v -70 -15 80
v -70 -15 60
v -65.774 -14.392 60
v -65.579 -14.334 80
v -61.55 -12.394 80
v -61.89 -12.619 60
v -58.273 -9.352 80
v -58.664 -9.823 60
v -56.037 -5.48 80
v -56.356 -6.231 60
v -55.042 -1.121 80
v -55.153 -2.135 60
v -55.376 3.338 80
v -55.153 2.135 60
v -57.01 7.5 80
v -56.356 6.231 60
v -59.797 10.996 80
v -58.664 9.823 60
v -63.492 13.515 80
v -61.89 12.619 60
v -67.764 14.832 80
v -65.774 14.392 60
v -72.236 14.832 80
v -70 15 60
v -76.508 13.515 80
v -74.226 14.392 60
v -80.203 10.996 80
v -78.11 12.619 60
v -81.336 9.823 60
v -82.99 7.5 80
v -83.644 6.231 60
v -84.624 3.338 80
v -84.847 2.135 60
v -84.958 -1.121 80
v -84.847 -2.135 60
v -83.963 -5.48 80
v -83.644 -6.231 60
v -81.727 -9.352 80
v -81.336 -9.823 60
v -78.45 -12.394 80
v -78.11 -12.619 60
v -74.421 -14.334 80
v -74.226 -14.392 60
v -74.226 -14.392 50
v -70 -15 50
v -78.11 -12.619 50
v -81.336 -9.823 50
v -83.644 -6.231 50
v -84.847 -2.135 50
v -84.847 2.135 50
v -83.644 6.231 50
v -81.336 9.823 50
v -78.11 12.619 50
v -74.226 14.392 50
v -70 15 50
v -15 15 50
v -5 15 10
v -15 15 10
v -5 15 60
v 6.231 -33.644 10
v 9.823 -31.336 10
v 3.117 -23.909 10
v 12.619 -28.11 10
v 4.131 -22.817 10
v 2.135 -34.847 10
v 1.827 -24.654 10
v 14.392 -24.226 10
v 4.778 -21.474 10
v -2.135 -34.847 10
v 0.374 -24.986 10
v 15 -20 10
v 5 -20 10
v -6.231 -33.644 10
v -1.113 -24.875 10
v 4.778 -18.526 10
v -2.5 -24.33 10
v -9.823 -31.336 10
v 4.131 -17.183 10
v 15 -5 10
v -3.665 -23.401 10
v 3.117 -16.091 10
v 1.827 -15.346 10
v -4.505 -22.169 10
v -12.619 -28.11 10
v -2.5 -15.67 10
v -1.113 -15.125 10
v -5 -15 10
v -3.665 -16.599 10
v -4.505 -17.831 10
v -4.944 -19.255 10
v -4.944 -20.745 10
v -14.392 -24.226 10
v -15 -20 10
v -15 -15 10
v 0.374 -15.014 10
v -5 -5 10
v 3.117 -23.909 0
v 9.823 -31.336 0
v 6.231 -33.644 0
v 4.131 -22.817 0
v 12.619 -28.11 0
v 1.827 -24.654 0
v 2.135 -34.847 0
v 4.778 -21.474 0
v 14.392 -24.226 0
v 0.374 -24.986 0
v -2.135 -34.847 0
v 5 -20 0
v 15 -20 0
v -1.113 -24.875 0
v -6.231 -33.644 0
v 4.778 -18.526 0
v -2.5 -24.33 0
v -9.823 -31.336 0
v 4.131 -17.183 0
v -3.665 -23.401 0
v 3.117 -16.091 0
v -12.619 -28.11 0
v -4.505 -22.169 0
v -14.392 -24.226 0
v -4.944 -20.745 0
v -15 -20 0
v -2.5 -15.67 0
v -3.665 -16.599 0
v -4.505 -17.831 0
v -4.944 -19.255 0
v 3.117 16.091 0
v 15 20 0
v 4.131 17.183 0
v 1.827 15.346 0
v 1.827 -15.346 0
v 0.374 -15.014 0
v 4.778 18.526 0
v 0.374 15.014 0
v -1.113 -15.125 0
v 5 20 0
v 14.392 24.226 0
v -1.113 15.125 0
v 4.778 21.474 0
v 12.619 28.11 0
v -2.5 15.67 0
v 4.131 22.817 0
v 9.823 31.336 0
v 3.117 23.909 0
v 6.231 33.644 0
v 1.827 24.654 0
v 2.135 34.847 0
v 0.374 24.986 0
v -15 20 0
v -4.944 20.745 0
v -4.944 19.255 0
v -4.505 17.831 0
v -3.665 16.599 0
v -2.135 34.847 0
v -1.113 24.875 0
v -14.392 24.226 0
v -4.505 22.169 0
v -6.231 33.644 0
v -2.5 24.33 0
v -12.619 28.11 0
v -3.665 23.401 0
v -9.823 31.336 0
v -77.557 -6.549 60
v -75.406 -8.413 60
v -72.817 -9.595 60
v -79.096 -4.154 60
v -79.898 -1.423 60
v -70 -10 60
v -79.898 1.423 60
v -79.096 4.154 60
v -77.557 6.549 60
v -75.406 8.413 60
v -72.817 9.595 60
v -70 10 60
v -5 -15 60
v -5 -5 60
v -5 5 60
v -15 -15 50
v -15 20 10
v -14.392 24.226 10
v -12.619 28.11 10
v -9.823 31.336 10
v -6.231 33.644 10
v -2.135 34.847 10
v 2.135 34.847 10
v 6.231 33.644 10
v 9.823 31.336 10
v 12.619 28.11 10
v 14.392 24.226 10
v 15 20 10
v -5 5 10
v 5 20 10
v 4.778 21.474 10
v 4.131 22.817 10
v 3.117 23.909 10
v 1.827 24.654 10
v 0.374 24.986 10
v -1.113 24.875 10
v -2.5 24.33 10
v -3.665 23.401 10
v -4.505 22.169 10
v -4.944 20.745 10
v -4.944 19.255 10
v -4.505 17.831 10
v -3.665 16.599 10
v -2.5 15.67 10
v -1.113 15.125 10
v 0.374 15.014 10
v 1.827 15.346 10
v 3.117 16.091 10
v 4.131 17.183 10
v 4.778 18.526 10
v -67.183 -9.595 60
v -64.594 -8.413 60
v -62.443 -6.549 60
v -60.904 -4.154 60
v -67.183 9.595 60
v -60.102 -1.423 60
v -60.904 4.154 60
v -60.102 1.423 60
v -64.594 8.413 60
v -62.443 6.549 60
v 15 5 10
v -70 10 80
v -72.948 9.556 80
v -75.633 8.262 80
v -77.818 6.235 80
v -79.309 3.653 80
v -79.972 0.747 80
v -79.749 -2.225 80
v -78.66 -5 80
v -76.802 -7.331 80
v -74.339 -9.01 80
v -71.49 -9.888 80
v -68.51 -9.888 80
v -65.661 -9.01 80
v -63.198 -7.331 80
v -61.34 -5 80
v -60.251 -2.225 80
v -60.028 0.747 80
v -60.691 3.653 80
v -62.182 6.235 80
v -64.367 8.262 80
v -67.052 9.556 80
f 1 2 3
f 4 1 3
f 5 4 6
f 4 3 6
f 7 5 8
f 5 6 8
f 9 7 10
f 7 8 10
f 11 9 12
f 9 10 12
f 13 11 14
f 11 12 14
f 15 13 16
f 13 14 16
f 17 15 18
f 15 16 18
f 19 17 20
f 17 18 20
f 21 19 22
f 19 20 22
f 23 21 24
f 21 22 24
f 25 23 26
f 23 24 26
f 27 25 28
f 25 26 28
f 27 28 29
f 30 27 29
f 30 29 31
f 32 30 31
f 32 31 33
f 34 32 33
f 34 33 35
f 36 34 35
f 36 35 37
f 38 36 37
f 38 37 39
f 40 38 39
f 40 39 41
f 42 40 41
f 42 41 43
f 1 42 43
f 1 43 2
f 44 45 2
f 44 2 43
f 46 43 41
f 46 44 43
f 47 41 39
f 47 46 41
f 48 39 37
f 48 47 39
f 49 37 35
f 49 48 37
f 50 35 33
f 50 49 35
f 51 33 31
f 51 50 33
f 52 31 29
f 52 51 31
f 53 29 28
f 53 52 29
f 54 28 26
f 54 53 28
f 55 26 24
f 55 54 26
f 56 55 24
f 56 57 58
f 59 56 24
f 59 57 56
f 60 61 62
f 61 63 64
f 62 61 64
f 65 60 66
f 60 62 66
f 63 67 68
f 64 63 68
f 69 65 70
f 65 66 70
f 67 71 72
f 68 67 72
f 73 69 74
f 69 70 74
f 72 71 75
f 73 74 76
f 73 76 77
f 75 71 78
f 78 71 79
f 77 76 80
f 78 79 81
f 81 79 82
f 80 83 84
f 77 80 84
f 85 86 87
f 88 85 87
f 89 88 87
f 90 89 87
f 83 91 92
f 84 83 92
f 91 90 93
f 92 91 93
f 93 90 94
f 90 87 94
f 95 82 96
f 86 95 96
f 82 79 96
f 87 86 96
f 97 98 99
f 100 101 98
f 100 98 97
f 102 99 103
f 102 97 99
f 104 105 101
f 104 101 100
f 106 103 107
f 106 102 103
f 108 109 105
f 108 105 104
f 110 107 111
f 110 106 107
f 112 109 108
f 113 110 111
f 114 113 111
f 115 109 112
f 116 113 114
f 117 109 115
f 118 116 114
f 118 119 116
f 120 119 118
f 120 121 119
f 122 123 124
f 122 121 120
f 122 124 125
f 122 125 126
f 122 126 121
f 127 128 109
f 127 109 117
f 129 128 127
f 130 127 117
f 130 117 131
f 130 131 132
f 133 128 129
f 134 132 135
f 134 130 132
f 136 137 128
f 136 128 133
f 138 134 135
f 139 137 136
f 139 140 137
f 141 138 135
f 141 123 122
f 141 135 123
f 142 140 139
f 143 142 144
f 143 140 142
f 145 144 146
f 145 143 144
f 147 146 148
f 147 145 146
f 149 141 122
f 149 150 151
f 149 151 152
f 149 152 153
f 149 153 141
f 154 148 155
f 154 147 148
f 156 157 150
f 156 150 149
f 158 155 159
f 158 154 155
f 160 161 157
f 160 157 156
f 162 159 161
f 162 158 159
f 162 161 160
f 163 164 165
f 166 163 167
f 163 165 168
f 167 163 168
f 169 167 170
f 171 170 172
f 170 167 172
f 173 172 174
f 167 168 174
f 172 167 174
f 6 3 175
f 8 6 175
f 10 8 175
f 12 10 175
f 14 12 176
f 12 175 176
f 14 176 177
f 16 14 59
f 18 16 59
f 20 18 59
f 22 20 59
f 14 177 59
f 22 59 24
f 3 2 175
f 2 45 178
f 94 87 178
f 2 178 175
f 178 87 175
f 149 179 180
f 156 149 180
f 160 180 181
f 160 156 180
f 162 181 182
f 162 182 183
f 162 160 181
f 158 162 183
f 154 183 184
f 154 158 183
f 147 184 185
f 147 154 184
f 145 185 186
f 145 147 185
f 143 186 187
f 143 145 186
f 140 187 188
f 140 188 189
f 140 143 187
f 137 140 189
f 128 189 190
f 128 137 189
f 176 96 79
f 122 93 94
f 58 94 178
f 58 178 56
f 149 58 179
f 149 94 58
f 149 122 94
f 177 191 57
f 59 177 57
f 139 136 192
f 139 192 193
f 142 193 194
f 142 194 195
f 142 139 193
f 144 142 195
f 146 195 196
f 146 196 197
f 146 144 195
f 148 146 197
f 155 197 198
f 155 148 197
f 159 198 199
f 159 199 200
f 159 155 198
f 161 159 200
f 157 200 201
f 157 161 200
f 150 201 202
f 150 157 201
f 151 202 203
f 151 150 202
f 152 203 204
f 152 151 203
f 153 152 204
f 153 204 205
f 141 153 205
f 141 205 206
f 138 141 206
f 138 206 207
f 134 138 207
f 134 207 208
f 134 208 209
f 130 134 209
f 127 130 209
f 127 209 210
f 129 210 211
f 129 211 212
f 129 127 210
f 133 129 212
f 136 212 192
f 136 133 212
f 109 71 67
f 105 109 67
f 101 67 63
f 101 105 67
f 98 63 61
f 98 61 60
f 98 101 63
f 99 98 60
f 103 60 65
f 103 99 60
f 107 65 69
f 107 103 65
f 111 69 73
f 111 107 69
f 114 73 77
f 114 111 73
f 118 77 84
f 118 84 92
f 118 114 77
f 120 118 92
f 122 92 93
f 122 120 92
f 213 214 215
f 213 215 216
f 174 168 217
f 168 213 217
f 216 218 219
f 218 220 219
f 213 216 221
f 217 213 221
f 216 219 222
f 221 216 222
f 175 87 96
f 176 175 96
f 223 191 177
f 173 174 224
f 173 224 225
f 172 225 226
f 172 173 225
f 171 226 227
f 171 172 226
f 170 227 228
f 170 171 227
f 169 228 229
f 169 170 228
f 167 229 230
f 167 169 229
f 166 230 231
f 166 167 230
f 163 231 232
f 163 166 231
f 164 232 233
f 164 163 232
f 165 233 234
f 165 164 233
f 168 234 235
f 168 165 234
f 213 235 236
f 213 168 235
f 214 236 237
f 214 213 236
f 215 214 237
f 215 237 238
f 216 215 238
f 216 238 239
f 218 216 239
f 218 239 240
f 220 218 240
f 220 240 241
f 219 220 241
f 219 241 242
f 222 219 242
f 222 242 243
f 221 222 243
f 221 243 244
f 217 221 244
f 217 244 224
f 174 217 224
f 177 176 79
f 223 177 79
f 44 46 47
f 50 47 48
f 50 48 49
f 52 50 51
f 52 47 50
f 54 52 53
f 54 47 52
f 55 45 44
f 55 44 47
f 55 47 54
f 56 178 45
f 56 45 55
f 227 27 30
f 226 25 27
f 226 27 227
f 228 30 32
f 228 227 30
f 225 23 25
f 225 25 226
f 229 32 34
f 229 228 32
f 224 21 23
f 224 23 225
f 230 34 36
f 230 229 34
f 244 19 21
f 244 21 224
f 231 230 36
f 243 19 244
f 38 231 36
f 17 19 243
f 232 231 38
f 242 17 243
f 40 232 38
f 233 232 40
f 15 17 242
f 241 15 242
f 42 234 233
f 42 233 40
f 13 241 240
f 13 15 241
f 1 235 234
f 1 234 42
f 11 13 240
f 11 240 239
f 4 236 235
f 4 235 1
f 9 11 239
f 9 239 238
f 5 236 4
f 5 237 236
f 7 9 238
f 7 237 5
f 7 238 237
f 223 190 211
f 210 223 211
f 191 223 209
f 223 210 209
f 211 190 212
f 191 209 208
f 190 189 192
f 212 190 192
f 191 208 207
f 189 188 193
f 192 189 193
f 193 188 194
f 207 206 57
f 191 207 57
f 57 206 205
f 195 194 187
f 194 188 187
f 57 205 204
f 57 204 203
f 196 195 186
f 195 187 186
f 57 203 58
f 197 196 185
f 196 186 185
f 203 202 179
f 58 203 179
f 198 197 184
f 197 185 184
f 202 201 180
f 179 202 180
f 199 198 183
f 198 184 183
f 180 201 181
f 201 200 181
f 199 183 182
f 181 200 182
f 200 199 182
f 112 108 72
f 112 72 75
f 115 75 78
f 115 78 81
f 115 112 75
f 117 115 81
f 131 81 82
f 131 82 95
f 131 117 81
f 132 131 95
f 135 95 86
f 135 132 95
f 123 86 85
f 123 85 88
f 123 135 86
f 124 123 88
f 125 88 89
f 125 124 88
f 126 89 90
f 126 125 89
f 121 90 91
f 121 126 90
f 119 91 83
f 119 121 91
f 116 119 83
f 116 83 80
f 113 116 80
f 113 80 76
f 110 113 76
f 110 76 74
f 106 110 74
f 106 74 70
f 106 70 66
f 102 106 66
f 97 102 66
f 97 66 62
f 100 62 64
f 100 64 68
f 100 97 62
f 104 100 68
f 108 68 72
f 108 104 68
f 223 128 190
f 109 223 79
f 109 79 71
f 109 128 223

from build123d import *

# Parameters (mm, degrees)
SKETCH_1_R          = 5
EXTRUDE_1_DEPTH     = 10
SKETCH_2_W          = 20
SKETCH_2_H          = 10
EXTRUDE_2_DEPTH     = 50
CUT_EXTRUDE_1_DEPTH = 50
SKETCH_5_W          = 10
SKETCH_5_H          = 30
EXTRUDE_3_DEPTH     = 50
SKETCH_6_W          = 10
SKETCH_6_H          = 30
EXTRUDE_4_DEPTH     = 55
SKETCH_7_R          = 15
SKETCH_7_R_2        = 10
EXTRUDE_5_DEPTH     = 20
SKETCH_8_R          = 15
EXTRUDE_6_DEPTH     = 10


with BuildPart() as part:
    # 草圖1 → 填料-伸長1 (new body)
    with BuildSketch(Plane.XY):
        with BuildLine():
            Line((15, 20), (15, -20))
            ThreePointArc((15, -20), (0, -35), (-15, -20))
            Line((-15, -20), (-15, 20))
            ThreePointArc((-15, 20), (0, 35), (15, 20))
        make_face()
        with Locations((0, -20)):
            Circle(SKETCH_1_R, mode=Mode.SUBTRACT)
        with Locations((0, 20)):
            Circle(SKETCH_1_R, mode=Mode.SUBTRACT)
    extrude(amount=EXTRUDE_1_DEPTH)

    # 草圖2 → 填料-伸長2 (add)
    with BuildSketch(Plane.XY.offset(10)):
        with Locations((5, 0)):
            Rectangle(SKETCH_2_W, SKETCH_2_H)
    extrude(amount=EXTRUDE_2_DEPTH)

    # 草圖4 → 除料-伸長1 (cut)
    with BuildSketch(Plane.XZ.offset(5)):
        Polygon((-5, 60), (15, 10), (15, 60), align=None)
    extrude(amount=-CUT_EXTRUDE_1_DEPTH, mode=Mode.SUBTRACT)

    # 草圖5 → 填料-伸長3 (add)
    with BuildSketch(Plane.XY.offset(10)):
        with Locations((-10, 0)):
            Rectangle(SKETCH_5_W, SKETCH_5_H)
    extrude(amount=EXTRUDE_3_DEPTH)

    # 草圖6 → 填料-伸長4 (add)
    with BuildSketch(Plane.ZY.offset(15)):
        with Locations((55, 0)):
            Rectangle(SKETCH_6_W, SKETCH_6_H)
    extrude(amount=EXTRUDE_4_DEPTH)

    # 草圖7 → 填料-伸長5 (add)
    with BuildSketch(Plane.XY.offset(60)):
        with Locations(Location((-70, 0, 0), (0, 0, 270))):
            Circle(SKETCH_7_R)
        with Locations(Location((-70, 0, 0), (0, 0, 90))):
            Circle(SKETCH_7_R_2, mode=Mode.SUBTRACT)
    extrude(amount=EXTRUDE_5_DEPTH)

    # 草圖8 → 填料-伸長6 (add)
    with BuildSketch(Plane(origin=(0, 0, 50), x_dir=(-1, 0, 0), z_dir=(0, 0, -1))):
        with Locations(Location((70, 0, 0), (0, 0, 90))):
            Circle(SKETCH_8_R)
    extrude(amount=-EXTRUDE_6_DEPTH)


solid = part.part
